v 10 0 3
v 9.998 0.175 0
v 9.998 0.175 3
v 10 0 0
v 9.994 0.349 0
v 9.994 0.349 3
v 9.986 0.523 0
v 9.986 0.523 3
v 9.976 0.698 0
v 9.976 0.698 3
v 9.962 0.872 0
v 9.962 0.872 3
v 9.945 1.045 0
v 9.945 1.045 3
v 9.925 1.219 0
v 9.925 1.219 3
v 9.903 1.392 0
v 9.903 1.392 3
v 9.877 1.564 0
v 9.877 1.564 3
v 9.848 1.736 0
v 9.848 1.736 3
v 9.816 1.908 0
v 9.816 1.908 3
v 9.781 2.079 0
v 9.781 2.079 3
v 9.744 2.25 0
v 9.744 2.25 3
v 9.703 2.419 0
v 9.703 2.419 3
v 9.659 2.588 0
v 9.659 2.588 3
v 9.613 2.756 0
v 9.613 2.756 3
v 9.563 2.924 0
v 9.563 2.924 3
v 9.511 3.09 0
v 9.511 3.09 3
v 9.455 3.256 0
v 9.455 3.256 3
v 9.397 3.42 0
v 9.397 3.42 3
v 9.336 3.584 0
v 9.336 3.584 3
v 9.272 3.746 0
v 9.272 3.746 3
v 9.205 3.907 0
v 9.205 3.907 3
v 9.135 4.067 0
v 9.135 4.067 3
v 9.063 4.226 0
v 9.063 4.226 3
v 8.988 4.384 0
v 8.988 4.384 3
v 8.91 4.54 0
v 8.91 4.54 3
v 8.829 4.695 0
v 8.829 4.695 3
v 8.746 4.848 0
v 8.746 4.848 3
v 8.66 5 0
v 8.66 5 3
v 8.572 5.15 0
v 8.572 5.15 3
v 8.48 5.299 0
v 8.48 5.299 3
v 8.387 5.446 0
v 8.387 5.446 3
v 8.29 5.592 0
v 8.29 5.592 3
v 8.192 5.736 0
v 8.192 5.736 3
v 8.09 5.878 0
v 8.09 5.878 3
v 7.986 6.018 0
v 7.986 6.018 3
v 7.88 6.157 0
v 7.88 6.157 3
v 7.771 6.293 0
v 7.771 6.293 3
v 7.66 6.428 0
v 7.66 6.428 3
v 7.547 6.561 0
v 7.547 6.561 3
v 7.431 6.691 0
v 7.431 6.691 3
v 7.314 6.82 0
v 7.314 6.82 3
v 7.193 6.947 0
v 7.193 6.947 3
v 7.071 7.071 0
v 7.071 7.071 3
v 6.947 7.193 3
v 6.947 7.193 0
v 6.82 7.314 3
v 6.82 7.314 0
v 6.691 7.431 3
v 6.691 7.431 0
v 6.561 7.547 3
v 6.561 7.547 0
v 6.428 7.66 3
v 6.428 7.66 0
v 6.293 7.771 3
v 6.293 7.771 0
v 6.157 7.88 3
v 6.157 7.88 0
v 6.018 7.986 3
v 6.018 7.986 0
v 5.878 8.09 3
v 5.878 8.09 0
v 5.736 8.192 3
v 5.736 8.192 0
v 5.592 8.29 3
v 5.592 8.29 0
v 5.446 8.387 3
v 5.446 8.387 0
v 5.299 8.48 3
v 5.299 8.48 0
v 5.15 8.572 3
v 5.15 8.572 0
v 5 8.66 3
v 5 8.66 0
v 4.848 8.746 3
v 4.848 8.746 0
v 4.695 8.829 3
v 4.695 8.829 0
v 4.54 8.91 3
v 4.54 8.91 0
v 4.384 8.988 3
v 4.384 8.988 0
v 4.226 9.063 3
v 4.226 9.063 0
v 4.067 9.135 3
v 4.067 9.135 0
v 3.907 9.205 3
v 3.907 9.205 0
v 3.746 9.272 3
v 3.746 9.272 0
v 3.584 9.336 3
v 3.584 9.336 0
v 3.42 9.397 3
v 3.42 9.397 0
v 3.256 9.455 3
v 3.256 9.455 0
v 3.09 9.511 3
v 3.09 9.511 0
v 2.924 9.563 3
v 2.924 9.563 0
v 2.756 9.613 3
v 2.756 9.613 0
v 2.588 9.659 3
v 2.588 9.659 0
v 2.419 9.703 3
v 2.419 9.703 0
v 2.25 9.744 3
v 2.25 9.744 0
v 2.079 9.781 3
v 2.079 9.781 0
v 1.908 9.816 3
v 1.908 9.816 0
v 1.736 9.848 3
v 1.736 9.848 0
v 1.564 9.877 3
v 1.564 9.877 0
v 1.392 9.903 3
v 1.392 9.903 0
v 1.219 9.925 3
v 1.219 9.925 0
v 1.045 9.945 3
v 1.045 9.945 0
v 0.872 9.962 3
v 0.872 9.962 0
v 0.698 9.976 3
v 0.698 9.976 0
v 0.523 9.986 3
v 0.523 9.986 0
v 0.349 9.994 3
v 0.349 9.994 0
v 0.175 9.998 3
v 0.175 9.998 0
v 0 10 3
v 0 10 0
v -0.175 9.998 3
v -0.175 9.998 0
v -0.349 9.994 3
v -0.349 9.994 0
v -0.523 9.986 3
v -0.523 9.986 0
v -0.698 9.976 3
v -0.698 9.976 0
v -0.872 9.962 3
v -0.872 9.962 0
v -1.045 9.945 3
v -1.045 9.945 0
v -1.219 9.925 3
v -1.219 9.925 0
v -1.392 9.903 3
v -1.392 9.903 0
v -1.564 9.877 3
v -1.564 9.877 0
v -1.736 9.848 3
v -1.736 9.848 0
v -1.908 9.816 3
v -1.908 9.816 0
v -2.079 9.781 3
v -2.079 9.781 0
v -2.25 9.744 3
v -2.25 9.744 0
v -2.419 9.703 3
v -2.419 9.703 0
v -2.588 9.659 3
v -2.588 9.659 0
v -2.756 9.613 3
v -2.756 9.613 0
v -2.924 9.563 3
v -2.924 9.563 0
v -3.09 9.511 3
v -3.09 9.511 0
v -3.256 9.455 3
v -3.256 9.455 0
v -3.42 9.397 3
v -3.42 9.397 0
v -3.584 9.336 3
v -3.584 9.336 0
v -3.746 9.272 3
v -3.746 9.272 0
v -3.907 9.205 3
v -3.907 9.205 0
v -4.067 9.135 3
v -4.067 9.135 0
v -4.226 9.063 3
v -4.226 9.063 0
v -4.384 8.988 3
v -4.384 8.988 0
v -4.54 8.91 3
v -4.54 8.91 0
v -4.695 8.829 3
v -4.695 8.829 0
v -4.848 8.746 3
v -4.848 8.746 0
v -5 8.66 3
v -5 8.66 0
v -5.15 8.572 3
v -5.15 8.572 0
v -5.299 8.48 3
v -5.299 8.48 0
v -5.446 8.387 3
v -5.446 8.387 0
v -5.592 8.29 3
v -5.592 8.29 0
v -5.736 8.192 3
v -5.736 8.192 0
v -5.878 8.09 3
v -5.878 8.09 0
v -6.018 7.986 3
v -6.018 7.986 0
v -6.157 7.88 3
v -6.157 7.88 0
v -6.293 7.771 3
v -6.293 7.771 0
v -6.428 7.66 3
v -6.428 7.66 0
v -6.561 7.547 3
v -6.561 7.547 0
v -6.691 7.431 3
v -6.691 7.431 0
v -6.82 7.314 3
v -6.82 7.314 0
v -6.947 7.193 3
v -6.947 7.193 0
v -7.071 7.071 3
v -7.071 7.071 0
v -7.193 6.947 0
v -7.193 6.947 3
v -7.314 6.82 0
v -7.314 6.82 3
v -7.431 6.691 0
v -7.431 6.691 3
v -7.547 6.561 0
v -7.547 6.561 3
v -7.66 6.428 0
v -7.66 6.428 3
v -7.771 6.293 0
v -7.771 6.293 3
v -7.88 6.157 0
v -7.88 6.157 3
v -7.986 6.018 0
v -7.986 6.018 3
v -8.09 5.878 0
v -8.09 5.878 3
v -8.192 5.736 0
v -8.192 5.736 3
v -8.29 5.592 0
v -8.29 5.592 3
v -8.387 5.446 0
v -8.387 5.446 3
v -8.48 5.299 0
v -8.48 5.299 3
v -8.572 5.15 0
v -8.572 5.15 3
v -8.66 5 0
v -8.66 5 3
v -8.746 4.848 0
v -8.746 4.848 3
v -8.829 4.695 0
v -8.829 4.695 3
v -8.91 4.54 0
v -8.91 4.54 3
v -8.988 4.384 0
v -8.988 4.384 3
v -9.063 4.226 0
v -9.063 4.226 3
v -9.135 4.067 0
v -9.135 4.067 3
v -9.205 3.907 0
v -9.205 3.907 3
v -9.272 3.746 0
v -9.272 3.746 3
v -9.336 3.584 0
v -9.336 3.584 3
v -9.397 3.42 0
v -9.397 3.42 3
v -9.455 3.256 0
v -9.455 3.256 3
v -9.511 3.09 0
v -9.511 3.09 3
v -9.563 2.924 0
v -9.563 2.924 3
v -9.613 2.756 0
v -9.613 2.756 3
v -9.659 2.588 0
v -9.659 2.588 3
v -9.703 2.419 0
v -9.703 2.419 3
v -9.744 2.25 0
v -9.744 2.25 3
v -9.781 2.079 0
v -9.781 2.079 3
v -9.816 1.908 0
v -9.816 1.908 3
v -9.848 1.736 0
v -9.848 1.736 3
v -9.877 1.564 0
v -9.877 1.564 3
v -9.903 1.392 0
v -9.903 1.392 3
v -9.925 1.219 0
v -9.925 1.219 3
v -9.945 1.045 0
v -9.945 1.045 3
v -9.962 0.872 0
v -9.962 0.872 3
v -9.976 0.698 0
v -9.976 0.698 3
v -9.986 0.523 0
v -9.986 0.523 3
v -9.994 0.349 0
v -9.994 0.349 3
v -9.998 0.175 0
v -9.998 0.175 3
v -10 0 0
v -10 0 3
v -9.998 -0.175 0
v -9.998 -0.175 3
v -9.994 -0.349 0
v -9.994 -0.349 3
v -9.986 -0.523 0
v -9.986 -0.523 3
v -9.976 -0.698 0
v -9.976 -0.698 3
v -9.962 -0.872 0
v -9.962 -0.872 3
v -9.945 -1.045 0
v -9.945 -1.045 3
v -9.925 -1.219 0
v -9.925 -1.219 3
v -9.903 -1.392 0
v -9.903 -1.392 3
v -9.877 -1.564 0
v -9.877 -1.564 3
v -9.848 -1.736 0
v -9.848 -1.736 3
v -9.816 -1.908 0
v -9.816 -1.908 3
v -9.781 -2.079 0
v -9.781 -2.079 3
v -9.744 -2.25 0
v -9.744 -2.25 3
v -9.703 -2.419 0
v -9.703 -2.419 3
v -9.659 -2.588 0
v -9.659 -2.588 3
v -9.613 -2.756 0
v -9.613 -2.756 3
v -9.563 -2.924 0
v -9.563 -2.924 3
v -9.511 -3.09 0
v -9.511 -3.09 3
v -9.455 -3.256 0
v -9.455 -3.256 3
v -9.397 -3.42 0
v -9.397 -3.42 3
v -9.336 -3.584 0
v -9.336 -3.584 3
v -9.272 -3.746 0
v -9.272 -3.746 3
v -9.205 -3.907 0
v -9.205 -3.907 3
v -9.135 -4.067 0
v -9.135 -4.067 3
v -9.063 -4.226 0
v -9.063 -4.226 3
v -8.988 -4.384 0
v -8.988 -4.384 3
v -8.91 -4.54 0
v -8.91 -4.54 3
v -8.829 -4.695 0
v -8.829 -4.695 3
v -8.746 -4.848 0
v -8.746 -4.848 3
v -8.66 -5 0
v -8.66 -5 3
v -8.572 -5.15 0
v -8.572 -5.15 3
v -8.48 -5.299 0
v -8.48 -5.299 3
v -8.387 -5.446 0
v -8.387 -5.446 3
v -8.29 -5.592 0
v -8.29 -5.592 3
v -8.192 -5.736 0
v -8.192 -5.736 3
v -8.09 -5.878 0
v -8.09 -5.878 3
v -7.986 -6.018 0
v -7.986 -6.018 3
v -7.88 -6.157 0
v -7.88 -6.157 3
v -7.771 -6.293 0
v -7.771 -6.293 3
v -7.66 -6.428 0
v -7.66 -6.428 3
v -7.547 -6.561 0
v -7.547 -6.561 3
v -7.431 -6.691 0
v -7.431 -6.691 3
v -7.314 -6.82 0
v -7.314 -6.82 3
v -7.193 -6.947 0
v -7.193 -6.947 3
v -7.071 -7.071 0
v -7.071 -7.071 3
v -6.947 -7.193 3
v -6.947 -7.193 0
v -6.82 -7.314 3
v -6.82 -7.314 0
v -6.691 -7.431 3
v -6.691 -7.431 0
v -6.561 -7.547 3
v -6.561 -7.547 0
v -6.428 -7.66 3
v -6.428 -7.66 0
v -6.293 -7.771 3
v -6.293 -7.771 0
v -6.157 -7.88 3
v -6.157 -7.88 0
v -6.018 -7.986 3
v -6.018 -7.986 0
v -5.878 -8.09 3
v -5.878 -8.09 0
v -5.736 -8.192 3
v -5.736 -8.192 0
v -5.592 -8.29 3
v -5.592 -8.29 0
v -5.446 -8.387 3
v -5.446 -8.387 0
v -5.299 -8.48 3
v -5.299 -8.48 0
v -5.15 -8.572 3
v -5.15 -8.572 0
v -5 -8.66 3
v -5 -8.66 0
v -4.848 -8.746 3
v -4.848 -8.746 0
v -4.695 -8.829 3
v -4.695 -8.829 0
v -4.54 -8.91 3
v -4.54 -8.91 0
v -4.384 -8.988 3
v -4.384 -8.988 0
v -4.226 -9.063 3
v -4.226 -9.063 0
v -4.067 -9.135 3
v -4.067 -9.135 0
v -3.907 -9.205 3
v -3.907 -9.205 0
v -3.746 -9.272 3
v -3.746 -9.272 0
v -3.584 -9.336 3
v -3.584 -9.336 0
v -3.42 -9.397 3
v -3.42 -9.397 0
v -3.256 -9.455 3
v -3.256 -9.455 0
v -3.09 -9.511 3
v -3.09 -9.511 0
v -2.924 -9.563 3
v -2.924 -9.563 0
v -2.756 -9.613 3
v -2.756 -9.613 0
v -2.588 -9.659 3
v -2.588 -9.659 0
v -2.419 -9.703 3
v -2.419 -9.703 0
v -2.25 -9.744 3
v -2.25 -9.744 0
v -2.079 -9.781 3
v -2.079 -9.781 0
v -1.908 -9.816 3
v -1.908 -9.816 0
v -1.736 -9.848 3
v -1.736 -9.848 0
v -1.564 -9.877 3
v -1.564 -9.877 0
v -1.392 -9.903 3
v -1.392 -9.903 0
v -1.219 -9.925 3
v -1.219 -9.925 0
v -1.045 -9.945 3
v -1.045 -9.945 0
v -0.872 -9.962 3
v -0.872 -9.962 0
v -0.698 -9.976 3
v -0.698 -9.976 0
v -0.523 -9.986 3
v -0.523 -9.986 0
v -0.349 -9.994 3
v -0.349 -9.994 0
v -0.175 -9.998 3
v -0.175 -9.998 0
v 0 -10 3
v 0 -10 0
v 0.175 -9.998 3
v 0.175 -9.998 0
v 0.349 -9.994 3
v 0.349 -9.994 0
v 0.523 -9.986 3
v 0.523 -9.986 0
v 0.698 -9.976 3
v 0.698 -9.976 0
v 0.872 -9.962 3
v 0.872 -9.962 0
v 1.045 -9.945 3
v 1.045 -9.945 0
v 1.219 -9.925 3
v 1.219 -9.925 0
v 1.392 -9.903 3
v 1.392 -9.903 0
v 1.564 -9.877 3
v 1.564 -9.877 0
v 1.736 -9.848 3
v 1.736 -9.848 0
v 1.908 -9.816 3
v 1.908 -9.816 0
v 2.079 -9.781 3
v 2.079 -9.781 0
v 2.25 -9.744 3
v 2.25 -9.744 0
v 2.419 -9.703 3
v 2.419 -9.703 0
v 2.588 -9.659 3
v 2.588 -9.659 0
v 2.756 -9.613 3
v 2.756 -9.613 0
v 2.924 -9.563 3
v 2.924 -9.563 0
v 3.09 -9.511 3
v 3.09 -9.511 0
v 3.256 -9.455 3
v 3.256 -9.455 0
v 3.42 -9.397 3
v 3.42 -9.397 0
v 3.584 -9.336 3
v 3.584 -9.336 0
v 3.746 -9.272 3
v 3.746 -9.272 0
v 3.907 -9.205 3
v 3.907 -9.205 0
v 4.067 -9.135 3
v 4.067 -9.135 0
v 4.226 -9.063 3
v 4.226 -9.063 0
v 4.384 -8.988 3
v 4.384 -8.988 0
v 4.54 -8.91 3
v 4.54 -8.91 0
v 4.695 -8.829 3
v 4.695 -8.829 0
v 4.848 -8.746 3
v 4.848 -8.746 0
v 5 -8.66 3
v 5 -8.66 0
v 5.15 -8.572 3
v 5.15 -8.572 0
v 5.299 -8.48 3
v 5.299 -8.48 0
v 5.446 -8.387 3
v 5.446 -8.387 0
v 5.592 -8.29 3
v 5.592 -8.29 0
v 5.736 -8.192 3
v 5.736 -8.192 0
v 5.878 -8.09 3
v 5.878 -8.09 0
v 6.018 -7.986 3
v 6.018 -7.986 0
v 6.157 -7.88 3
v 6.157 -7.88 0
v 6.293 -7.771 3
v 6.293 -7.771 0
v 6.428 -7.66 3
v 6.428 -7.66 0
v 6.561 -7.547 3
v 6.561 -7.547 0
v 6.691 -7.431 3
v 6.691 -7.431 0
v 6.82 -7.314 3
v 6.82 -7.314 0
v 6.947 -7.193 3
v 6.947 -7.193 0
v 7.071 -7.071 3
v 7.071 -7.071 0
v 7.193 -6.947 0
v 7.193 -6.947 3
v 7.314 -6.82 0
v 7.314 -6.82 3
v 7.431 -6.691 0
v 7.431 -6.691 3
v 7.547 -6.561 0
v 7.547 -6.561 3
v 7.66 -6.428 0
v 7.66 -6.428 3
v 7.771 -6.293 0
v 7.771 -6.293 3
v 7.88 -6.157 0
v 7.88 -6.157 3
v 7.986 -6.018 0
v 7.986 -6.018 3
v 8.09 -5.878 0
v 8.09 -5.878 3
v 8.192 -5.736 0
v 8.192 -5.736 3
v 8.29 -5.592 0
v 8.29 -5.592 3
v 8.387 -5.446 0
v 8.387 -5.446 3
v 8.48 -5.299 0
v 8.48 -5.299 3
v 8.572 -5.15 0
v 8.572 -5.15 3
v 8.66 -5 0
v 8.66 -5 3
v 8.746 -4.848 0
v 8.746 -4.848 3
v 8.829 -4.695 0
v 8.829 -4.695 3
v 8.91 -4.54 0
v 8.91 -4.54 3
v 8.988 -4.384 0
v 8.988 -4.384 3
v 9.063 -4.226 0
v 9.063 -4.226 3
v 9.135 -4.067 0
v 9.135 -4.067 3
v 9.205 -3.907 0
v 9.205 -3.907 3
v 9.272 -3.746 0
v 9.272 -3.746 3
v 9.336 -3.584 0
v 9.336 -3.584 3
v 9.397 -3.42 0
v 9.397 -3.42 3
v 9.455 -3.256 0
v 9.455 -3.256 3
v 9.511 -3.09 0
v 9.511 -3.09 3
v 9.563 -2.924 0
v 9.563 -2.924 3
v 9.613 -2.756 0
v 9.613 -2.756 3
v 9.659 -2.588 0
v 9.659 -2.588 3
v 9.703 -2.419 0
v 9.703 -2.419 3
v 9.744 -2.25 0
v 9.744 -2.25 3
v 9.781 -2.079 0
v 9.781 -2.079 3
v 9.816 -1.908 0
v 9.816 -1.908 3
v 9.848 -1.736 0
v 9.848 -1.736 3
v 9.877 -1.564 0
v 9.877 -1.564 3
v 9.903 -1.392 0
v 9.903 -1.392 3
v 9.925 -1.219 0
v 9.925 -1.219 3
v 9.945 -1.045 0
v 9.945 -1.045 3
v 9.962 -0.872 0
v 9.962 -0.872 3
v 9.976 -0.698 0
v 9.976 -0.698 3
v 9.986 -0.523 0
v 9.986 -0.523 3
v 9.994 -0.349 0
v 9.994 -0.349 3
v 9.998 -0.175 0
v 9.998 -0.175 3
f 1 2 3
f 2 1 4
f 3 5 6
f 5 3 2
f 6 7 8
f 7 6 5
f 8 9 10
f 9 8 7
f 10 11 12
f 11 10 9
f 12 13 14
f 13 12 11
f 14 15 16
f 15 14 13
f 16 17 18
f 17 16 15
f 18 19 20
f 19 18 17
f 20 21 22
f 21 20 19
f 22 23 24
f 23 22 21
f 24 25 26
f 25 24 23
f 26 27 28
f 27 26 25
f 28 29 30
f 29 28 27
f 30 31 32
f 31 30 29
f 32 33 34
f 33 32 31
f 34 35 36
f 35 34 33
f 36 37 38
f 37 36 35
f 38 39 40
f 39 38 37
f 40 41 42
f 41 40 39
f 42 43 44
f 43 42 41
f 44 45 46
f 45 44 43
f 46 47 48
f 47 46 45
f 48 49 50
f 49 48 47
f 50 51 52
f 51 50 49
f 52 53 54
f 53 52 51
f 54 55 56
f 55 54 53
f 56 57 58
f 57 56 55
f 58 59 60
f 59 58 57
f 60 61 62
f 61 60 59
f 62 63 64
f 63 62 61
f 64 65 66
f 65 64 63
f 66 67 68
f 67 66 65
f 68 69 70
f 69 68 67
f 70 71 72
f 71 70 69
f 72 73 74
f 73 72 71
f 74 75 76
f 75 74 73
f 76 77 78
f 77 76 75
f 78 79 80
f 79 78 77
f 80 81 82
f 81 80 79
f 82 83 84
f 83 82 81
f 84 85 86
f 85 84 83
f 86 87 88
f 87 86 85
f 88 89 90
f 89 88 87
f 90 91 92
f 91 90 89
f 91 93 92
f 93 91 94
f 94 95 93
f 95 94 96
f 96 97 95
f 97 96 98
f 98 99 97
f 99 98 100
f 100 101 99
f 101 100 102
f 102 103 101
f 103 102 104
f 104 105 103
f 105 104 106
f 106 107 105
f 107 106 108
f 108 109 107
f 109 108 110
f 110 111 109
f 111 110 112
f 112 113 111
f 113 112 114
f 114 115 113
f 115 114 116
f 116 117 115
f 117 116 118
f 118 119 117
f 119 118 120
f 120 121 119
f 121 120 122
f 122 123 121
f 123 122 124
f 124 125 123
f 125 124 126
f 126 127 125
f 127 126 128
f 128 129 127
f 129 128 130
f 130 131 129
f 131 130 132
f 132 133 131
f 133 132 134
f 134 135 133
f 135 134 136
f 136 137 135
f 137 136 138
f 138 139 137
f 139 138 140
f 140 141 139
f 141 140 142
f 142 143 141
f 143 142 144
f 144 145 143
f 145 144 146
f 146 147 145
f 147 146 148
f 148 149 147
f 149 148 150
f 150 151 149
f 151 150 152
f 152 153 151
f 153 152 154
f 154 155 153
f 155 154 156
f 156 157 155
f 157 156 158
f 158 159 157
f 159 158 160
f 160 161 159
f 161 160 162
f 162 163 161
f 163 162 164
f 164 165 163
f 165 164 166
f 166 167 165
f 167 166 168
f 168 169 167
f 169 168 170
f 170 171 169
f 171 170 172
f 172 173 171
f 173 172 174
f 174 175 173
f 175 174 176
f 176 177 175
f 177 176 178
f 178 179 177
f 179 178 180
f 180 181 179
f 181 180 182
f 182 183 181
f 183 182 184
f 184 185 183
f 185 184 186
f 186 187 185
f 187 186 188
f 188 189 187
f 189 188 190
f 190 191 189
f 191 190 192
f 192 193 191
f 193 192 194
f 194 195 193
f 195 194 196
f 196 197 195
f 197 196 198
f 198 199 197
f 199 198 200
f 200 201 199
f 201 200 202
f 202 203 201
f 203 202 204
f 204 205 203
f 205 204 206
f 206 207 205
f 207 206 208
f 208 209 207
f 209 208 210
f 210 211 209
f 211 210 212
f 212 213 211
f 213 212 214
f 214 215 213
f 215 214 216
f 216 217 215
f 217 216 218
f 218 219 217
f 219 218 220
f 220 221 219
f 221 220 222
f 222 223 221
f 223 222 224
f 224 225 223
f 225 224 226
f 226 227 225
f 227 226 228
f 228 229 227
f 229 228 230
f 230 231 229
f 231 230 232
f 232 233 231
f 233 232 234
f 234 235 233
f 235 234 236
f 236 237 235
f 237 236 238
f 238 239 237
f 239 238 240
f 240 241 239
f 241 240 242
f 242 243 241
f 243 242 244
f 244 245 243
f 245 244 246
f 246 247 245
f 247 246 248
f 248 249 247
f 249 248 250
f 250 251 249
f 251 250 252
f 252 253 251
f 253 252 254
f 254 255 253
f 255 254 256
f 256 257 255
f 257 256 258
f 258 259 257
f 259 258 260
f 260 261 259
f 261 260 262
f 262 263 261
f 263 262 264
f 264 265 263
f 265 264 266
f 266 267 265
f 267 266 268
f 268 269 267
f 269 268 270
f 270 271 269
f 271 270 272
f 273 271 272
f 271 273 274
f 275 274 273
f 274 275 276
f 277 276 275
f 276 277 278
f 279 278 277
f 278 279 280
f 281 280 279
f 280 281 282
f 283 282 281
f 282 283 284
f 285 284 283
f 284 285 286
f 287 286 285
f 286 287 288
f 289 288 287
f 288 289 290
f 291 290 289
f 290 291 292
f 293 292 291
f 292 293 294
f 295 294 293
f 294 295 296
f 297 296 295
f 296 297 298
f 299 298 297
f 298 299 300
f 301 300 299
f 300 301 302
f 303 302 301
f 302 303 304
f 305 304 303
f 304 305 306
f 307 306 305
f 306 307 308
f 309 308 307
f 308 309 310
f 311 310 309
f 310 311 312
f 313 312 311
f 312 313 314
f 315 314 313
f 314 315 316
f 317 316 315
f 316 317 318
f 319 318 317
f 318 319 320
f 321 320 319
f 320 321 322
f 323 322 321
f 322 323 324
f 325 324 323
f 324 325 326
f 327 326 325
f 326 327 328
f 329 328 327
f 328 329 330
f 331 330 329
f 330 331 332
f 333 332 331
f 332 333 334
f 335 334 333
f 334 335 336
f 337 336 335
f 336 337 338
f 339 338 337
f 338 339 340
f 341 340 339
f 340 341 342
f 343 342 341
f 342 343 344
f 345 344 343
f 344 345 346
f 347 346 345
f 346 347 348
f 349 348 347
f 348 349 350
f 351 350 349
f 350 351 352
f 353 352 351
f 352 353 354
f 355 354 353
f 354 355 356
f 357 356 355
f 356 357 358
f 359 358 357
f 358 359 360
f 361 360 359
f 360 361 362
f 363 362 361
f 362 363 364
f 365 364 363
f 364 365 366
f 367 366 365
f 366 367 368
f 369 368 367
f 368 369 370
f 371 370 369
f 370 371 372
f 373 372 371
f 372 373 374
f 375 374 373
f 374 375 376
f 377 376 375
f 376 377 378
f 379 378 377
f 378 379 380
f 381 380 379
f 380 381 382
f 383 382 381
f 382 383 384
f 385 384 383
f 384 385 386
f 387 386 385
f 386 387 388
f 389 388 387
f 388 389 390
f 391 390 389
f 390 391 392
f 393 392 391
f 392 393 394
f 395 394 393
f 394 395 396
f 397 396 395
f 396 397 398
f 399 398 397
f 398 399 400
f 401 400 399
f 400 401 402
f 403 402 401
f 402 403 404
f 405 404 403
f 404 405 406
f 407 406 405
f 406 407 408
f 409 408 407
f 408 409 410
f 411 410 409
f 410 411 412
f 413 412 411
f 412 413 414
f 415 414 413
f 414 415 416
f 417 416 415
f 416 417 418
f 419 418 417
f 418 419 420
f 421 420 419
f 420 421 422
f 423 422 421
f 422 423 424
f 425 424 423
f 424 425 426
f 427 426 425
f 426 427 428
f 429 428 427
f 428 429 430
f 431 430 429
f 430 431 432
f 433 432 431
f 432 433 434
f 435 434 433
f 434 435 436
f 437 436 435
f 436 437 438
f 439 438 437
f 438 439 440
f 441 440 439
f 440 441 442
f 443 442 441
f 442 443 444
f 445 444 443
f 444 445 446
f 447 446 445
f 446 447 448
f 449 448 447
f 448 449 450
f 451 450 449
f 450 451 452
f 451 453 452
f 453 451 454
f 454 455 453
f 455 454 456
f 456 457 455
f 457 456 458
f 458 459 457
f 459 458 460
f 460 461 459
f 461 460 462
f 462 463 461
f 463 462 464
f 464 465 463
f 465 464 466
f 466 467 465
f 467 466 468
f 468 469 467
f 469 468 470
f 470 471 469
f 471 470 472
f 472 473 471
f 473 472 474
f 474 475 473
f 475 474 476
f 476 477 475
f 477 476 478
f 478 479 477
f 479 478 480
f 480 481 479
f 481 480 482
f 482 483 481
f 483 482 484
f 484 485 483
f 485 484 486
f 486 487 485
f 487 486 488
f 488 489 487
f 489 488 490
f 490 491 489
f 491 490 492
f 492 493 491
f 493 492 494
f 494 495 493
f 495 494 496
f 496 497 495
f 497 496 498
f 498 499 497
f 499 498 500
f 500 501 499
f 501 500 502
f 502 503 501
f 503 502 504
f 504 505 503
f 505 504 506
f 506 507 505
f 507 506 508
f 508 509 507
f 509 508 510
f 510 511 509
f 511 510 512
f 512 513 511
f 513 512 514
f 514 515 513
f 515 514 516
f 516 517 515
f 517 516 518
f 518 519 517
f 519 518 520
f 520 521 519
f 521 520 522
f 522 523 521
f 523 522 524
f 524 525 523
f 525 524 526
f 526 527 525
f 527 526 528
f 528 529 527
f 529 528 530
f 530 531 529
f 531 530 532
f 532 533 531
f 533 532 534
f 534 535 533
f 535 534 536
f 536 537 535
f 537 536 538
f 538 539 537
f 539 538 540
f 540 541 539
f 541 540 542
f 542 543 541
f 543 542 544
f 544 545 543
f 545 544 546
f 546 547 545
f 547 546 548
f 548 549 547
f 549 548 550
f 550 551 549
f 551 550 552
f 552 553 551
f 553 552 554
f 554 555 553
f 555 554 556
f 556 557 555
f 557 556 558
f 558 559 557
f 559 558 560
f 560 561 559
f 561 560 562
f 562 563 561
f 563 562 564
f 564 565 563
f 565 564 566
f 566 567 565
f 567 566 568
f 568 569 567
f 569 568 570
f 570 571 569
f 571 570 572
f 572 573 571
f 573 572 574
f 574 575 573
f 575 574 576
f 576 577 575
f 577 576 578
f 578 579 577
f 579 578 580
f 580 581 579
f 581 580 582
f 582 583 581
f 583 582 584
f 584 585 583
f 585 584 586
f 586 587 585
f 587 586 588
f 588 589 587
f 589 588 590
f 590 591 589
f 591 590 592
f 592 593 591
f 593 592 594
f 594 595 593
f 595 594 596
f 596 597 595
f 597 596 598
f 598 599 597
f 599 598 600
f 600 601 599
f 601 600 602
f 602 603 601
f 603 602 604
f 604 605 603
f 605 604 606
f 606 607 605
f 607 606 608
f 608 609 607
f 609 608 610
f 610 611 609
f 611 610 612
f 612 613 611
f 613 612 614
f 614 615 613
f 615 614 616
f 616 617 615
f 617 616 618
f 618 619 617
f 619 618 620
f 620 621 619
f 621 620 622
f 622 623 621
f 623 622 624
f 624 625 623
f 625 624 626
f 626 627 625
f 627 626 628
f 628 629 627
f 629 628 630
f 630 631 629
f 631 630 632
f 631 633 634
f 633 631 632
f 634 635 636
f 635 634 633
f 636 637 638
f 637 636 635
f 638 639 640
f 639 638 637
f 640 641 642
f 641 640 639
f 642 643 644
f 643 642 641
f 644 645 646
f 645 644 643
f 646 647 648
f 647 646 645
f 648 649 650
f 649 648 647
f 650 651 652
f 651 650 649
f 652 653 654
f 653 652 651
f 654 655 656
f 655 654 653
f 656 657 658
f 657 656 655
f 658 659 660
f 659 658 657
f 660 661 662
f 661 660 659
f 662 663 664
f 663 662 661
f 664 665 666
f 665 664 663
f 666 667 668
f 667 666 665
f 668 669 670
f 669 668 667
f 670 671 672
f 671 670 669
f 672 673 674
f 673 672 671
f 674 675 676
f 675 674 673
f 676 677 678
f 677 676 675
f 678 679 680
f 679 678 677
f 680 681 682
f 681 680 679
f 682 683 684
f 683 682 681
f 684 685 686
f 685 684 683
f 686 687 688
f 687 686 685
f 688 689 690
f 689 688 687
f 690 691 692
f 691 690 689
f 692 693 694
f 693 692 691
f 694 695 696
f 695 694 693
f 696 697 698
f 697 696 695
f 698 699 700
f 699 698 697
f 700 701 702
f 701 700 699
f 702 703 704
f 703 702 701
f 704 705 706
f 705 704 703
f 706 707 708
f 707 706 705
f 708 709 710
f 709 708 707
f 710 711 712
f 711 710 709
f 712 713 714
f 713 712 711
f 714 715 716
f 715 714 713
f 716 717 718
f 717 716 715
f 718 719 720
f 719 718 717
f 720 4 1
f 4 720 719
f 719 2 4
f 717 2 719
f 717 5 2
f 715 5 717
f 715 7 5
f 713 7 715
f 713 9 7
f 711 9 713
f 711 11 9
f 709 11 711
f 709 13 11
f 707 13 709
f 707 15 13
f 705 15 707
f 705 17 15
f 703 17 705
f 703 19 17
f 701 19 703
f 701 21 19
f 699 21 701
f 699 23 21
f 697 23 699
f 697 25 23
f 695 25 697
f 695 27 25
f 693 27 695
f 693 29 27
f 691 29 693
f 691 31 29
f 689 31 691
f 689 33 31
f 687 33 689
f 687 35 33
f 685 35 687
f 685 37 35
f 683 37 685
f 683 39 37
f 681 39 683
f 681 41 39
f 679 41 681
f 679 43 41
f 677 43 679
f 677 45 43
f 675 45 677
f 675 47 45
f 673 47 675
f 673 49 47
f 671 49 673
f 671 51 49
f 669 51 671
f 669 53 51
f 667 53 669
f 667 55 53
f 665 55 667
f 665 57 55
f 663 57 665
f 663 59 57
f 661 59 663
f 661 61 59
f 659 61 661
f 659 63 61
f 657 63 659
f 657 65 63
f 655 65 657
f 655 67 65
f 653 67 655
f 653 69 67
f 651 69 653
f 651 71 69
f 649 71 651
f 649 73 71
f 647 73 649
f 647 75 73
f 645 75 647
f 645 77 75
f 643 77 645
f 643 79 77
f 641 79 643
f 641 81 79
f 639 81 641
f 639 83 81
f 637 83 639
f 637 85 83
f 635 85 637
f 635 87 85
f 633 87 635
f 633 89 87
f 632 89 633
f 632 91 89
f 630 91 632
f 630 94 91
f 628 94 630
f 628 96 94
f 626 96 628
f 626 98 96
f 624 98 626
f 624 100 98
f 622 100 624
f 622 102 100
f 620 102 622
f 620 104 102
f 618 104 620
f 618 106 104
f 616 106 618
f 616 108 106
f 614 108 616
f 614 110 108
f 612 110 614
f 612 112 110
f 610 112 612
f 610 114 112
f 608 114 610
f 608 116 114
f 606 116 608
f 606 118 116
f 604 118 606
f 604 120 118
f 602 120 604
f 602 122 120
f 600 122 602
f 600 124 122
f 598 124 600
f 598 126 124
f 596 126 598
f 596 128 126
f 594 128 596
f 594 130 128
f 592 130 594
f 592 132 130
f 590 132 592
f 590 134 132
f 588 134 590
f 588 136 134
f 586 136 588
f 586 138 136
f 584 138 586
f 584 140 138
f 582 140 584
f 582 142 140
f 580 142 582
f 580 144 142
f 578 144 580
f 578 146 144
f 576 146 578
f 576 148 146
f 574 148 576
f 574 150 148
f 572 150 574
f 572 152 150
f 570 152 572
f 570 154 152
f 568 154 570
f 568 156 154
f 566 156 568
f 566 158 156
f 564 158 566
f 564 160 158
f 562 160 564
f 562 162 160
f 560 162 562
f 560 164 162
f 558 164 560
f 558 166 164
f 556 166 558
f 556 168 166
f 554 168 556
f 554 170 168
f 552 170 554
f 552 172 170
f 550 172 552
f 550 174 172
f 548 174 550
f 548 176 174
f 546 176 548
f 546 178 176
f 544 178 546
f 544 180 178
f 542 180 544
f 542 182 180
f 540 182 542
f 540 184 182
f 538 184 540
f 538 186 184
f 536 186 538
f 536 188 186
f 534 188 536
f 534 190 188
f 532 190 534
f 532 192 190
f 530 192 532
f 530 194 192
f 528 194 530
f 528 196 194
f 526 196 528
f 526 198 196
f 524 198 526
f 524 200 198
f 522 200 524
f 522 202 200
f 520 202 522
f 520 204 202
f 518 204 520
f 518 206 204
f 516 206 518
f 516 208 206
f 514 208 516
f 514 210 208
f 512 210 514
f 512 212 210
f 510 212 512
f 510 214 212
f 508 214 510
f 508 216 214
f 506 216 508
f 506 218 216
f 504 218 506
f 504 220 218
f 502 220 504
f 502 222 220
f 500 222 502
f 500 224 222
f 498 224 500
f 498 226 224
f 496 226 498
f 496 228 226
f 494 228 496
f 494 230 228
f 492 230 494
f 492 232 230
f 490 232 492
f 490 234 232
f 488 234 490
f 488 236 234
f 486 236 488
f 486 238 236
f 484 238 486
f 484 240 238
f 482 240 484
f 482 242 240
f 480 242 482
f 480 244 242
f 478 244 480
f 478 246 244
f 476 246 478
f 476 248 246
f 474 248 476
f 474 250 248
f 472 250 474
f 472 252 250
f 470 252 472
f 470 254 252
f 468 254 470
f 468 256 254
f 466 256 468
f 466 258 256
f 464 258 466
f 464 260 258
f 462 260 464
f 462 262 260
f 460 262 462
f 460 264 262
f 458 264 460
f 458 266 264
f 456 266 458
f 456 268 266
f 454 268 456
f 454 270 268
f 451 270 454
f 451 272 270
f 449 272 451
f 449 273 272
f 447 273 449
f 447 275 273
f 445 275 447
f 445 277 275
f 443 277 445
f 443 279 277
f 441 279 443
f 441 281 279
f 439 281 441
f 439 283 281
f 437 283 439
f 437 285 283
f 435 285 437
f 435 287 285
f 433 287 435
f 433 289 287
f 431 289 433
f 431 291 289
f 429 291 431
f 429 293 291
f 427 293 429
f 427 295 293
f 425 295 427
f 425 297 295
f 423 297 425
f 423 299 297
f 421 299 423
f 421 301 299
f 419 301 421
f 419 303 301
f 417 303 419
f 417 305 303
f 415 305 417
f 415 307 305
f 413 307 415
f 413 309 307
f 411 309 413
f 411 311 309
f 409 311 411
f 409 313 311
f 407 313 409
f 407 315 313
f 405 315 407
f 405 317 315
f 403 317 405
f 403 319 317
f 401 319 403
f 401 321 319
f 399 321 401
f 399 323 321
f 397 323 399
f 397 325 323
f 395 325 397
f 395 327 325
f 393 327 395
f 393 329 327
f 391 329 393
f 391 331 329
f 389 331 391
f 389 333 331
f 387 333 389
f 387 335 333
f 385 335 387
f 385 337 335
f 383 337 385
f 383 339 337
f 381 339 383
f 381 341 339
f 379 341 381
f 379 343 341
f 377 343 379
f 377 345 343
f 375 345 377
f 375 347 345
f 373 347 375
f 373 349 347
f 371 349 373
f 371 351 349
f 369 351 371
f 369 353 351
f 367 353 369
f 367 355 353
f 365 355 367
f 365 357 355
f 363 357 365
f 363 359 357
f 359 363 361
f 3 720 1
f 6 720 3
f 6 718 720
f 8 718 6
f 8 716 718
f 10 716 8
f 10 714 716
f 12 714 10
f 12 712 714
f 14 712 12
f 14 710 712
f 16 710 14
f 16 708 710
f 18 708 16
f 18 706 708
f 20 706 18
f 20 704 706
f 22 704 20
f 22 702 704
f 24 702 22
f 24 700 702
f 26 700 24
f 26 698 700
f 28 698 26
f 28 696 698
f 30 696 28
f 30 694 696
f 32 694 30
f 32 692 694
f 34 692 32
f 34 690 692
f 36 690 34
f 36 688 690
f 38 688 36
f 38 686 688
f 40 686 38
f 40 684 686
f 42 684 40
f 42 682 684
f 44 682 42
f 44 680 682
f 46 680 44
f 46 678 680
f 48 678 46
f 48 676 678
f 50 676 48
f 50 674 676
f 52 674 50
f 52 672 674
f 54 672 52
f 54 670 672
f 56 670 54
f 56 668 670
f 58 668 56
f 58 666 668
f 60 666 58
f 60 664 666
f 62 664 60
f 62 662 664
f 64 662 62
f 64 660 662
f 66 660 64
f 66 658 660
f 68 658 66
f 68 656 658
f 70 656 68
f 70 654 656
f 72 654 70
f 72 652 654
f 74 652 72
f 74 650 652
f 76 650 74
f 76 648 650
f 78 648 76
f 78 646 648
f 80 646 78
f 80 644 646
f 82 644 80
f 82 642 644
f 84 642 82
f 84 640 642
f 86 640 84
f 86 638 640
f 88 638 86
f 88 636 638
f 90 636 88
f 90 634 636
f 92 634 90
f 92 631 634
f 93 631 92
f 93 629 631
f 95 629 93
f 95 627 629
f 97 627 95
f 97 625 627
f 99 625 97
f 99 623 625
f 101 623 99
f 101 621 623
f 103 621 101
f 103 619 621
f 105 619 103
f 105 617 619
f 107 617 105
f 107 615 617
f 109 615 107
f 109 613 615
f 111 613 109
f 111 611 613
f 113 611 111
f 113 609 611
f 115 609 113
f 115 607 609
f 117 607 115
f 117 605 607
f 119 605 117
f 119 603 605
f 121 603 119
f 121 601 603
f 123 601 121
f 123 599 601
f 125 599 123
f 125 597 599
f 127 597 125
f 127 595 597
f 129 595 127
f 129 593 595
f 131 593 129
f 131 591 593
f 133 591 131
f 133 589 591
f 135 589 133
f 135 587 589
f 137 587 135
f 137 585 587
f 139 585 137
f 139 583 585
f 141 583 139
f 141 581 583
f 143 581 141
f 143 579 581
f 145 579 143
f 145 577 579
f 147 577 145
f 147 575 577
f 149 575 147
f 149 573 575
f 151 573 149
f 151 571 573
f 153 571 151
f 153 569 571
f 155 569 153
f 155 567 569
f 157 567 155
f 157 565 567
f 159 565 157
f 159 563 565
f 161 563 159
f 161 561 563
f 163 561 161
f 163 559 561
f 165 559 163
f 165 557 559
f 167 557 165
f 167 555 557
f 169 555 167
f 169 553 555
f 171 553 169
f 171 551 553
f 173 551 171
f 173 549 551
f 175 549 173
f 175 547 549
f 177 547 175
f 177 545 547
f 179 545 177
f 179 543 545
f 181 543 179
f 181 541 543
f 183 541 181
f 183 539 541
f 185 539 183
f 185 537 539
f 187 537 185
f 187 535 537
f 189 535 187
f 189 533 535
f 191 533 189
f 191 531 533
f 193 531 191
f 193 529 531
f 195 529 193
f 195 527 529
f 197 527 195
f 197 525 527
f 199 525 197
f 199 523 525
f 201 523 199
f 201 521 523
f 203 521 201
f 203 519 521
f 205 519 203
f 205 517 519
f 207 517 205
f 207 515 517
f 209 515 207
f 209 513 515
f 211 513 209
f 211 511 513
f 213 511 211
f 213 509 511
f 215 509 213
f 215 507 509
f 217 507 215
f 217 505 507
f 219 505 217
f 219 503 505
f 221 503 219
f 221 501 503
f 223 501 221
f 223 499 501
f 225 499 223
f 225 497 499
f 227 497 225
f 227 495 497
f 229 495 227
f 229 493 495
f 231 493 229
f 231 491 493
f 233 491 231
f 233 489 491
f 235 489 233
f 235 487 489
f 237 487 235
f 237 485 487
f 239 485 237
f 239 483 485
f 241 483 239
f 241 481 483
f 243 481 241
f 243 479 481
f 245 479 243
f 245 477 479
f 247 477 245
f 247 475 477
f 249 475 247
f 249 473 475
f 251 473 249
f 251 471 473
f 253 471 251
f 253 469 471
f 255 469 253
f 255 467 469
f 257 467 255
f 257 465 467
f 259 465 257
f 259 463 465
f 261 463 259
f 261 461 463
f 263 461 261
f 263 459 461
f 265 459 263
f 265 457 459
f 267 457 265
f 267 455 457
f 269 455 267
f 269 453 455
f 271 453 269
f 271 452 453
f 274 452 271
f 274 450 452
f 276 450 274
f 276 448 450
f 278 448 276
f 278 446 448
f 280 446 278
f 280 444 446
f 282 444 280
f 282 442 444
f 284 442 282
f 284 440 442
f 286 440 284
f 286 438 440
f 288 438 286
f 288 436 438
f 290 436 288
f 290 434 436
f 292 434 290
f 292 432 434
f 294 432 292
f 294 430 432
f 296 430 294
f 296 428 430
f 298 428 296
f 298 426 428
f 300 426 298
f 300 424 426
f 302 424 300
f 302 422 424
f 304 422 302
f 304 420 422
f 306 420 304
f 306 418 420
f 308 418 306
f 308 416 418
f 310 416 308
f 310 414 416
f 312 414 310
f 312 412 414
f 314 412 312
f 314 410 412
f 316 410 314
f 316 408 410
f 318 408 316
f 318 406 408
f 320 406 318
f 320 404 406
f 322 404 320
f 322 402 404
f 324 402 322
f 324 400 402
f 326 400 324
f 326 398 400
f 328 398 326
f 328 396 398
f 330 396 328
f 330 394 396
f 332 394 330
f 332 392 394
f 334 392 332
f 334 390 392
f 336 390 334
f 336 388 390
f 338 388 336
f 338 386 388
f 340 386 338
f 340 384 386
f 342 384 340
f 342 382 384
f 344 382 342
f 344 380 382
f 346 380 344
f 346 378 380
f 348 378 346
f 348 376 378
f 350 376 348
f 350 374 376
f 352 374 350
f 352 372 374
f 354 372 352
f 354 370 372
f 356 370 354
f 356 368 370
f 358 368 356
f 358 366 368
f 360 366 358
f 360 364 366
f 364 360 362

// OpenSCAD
//@Model: Slime
//@Author: Yurre
//@Version: 1

/* [Base] */
//Determine whether or not the character has a round base
hasBase = true;

//Base height in mm
baseHeight = 3.0;

//Base diameter in mm
baseD = 20.0;

/* [Misc.] */
//Determine how nice round parts are
resolution = 360;


$fn = resolution;

//begin modelling
if(hasBase){
    cylinder(h = baseHeight, d = baseD, center = false);
}
